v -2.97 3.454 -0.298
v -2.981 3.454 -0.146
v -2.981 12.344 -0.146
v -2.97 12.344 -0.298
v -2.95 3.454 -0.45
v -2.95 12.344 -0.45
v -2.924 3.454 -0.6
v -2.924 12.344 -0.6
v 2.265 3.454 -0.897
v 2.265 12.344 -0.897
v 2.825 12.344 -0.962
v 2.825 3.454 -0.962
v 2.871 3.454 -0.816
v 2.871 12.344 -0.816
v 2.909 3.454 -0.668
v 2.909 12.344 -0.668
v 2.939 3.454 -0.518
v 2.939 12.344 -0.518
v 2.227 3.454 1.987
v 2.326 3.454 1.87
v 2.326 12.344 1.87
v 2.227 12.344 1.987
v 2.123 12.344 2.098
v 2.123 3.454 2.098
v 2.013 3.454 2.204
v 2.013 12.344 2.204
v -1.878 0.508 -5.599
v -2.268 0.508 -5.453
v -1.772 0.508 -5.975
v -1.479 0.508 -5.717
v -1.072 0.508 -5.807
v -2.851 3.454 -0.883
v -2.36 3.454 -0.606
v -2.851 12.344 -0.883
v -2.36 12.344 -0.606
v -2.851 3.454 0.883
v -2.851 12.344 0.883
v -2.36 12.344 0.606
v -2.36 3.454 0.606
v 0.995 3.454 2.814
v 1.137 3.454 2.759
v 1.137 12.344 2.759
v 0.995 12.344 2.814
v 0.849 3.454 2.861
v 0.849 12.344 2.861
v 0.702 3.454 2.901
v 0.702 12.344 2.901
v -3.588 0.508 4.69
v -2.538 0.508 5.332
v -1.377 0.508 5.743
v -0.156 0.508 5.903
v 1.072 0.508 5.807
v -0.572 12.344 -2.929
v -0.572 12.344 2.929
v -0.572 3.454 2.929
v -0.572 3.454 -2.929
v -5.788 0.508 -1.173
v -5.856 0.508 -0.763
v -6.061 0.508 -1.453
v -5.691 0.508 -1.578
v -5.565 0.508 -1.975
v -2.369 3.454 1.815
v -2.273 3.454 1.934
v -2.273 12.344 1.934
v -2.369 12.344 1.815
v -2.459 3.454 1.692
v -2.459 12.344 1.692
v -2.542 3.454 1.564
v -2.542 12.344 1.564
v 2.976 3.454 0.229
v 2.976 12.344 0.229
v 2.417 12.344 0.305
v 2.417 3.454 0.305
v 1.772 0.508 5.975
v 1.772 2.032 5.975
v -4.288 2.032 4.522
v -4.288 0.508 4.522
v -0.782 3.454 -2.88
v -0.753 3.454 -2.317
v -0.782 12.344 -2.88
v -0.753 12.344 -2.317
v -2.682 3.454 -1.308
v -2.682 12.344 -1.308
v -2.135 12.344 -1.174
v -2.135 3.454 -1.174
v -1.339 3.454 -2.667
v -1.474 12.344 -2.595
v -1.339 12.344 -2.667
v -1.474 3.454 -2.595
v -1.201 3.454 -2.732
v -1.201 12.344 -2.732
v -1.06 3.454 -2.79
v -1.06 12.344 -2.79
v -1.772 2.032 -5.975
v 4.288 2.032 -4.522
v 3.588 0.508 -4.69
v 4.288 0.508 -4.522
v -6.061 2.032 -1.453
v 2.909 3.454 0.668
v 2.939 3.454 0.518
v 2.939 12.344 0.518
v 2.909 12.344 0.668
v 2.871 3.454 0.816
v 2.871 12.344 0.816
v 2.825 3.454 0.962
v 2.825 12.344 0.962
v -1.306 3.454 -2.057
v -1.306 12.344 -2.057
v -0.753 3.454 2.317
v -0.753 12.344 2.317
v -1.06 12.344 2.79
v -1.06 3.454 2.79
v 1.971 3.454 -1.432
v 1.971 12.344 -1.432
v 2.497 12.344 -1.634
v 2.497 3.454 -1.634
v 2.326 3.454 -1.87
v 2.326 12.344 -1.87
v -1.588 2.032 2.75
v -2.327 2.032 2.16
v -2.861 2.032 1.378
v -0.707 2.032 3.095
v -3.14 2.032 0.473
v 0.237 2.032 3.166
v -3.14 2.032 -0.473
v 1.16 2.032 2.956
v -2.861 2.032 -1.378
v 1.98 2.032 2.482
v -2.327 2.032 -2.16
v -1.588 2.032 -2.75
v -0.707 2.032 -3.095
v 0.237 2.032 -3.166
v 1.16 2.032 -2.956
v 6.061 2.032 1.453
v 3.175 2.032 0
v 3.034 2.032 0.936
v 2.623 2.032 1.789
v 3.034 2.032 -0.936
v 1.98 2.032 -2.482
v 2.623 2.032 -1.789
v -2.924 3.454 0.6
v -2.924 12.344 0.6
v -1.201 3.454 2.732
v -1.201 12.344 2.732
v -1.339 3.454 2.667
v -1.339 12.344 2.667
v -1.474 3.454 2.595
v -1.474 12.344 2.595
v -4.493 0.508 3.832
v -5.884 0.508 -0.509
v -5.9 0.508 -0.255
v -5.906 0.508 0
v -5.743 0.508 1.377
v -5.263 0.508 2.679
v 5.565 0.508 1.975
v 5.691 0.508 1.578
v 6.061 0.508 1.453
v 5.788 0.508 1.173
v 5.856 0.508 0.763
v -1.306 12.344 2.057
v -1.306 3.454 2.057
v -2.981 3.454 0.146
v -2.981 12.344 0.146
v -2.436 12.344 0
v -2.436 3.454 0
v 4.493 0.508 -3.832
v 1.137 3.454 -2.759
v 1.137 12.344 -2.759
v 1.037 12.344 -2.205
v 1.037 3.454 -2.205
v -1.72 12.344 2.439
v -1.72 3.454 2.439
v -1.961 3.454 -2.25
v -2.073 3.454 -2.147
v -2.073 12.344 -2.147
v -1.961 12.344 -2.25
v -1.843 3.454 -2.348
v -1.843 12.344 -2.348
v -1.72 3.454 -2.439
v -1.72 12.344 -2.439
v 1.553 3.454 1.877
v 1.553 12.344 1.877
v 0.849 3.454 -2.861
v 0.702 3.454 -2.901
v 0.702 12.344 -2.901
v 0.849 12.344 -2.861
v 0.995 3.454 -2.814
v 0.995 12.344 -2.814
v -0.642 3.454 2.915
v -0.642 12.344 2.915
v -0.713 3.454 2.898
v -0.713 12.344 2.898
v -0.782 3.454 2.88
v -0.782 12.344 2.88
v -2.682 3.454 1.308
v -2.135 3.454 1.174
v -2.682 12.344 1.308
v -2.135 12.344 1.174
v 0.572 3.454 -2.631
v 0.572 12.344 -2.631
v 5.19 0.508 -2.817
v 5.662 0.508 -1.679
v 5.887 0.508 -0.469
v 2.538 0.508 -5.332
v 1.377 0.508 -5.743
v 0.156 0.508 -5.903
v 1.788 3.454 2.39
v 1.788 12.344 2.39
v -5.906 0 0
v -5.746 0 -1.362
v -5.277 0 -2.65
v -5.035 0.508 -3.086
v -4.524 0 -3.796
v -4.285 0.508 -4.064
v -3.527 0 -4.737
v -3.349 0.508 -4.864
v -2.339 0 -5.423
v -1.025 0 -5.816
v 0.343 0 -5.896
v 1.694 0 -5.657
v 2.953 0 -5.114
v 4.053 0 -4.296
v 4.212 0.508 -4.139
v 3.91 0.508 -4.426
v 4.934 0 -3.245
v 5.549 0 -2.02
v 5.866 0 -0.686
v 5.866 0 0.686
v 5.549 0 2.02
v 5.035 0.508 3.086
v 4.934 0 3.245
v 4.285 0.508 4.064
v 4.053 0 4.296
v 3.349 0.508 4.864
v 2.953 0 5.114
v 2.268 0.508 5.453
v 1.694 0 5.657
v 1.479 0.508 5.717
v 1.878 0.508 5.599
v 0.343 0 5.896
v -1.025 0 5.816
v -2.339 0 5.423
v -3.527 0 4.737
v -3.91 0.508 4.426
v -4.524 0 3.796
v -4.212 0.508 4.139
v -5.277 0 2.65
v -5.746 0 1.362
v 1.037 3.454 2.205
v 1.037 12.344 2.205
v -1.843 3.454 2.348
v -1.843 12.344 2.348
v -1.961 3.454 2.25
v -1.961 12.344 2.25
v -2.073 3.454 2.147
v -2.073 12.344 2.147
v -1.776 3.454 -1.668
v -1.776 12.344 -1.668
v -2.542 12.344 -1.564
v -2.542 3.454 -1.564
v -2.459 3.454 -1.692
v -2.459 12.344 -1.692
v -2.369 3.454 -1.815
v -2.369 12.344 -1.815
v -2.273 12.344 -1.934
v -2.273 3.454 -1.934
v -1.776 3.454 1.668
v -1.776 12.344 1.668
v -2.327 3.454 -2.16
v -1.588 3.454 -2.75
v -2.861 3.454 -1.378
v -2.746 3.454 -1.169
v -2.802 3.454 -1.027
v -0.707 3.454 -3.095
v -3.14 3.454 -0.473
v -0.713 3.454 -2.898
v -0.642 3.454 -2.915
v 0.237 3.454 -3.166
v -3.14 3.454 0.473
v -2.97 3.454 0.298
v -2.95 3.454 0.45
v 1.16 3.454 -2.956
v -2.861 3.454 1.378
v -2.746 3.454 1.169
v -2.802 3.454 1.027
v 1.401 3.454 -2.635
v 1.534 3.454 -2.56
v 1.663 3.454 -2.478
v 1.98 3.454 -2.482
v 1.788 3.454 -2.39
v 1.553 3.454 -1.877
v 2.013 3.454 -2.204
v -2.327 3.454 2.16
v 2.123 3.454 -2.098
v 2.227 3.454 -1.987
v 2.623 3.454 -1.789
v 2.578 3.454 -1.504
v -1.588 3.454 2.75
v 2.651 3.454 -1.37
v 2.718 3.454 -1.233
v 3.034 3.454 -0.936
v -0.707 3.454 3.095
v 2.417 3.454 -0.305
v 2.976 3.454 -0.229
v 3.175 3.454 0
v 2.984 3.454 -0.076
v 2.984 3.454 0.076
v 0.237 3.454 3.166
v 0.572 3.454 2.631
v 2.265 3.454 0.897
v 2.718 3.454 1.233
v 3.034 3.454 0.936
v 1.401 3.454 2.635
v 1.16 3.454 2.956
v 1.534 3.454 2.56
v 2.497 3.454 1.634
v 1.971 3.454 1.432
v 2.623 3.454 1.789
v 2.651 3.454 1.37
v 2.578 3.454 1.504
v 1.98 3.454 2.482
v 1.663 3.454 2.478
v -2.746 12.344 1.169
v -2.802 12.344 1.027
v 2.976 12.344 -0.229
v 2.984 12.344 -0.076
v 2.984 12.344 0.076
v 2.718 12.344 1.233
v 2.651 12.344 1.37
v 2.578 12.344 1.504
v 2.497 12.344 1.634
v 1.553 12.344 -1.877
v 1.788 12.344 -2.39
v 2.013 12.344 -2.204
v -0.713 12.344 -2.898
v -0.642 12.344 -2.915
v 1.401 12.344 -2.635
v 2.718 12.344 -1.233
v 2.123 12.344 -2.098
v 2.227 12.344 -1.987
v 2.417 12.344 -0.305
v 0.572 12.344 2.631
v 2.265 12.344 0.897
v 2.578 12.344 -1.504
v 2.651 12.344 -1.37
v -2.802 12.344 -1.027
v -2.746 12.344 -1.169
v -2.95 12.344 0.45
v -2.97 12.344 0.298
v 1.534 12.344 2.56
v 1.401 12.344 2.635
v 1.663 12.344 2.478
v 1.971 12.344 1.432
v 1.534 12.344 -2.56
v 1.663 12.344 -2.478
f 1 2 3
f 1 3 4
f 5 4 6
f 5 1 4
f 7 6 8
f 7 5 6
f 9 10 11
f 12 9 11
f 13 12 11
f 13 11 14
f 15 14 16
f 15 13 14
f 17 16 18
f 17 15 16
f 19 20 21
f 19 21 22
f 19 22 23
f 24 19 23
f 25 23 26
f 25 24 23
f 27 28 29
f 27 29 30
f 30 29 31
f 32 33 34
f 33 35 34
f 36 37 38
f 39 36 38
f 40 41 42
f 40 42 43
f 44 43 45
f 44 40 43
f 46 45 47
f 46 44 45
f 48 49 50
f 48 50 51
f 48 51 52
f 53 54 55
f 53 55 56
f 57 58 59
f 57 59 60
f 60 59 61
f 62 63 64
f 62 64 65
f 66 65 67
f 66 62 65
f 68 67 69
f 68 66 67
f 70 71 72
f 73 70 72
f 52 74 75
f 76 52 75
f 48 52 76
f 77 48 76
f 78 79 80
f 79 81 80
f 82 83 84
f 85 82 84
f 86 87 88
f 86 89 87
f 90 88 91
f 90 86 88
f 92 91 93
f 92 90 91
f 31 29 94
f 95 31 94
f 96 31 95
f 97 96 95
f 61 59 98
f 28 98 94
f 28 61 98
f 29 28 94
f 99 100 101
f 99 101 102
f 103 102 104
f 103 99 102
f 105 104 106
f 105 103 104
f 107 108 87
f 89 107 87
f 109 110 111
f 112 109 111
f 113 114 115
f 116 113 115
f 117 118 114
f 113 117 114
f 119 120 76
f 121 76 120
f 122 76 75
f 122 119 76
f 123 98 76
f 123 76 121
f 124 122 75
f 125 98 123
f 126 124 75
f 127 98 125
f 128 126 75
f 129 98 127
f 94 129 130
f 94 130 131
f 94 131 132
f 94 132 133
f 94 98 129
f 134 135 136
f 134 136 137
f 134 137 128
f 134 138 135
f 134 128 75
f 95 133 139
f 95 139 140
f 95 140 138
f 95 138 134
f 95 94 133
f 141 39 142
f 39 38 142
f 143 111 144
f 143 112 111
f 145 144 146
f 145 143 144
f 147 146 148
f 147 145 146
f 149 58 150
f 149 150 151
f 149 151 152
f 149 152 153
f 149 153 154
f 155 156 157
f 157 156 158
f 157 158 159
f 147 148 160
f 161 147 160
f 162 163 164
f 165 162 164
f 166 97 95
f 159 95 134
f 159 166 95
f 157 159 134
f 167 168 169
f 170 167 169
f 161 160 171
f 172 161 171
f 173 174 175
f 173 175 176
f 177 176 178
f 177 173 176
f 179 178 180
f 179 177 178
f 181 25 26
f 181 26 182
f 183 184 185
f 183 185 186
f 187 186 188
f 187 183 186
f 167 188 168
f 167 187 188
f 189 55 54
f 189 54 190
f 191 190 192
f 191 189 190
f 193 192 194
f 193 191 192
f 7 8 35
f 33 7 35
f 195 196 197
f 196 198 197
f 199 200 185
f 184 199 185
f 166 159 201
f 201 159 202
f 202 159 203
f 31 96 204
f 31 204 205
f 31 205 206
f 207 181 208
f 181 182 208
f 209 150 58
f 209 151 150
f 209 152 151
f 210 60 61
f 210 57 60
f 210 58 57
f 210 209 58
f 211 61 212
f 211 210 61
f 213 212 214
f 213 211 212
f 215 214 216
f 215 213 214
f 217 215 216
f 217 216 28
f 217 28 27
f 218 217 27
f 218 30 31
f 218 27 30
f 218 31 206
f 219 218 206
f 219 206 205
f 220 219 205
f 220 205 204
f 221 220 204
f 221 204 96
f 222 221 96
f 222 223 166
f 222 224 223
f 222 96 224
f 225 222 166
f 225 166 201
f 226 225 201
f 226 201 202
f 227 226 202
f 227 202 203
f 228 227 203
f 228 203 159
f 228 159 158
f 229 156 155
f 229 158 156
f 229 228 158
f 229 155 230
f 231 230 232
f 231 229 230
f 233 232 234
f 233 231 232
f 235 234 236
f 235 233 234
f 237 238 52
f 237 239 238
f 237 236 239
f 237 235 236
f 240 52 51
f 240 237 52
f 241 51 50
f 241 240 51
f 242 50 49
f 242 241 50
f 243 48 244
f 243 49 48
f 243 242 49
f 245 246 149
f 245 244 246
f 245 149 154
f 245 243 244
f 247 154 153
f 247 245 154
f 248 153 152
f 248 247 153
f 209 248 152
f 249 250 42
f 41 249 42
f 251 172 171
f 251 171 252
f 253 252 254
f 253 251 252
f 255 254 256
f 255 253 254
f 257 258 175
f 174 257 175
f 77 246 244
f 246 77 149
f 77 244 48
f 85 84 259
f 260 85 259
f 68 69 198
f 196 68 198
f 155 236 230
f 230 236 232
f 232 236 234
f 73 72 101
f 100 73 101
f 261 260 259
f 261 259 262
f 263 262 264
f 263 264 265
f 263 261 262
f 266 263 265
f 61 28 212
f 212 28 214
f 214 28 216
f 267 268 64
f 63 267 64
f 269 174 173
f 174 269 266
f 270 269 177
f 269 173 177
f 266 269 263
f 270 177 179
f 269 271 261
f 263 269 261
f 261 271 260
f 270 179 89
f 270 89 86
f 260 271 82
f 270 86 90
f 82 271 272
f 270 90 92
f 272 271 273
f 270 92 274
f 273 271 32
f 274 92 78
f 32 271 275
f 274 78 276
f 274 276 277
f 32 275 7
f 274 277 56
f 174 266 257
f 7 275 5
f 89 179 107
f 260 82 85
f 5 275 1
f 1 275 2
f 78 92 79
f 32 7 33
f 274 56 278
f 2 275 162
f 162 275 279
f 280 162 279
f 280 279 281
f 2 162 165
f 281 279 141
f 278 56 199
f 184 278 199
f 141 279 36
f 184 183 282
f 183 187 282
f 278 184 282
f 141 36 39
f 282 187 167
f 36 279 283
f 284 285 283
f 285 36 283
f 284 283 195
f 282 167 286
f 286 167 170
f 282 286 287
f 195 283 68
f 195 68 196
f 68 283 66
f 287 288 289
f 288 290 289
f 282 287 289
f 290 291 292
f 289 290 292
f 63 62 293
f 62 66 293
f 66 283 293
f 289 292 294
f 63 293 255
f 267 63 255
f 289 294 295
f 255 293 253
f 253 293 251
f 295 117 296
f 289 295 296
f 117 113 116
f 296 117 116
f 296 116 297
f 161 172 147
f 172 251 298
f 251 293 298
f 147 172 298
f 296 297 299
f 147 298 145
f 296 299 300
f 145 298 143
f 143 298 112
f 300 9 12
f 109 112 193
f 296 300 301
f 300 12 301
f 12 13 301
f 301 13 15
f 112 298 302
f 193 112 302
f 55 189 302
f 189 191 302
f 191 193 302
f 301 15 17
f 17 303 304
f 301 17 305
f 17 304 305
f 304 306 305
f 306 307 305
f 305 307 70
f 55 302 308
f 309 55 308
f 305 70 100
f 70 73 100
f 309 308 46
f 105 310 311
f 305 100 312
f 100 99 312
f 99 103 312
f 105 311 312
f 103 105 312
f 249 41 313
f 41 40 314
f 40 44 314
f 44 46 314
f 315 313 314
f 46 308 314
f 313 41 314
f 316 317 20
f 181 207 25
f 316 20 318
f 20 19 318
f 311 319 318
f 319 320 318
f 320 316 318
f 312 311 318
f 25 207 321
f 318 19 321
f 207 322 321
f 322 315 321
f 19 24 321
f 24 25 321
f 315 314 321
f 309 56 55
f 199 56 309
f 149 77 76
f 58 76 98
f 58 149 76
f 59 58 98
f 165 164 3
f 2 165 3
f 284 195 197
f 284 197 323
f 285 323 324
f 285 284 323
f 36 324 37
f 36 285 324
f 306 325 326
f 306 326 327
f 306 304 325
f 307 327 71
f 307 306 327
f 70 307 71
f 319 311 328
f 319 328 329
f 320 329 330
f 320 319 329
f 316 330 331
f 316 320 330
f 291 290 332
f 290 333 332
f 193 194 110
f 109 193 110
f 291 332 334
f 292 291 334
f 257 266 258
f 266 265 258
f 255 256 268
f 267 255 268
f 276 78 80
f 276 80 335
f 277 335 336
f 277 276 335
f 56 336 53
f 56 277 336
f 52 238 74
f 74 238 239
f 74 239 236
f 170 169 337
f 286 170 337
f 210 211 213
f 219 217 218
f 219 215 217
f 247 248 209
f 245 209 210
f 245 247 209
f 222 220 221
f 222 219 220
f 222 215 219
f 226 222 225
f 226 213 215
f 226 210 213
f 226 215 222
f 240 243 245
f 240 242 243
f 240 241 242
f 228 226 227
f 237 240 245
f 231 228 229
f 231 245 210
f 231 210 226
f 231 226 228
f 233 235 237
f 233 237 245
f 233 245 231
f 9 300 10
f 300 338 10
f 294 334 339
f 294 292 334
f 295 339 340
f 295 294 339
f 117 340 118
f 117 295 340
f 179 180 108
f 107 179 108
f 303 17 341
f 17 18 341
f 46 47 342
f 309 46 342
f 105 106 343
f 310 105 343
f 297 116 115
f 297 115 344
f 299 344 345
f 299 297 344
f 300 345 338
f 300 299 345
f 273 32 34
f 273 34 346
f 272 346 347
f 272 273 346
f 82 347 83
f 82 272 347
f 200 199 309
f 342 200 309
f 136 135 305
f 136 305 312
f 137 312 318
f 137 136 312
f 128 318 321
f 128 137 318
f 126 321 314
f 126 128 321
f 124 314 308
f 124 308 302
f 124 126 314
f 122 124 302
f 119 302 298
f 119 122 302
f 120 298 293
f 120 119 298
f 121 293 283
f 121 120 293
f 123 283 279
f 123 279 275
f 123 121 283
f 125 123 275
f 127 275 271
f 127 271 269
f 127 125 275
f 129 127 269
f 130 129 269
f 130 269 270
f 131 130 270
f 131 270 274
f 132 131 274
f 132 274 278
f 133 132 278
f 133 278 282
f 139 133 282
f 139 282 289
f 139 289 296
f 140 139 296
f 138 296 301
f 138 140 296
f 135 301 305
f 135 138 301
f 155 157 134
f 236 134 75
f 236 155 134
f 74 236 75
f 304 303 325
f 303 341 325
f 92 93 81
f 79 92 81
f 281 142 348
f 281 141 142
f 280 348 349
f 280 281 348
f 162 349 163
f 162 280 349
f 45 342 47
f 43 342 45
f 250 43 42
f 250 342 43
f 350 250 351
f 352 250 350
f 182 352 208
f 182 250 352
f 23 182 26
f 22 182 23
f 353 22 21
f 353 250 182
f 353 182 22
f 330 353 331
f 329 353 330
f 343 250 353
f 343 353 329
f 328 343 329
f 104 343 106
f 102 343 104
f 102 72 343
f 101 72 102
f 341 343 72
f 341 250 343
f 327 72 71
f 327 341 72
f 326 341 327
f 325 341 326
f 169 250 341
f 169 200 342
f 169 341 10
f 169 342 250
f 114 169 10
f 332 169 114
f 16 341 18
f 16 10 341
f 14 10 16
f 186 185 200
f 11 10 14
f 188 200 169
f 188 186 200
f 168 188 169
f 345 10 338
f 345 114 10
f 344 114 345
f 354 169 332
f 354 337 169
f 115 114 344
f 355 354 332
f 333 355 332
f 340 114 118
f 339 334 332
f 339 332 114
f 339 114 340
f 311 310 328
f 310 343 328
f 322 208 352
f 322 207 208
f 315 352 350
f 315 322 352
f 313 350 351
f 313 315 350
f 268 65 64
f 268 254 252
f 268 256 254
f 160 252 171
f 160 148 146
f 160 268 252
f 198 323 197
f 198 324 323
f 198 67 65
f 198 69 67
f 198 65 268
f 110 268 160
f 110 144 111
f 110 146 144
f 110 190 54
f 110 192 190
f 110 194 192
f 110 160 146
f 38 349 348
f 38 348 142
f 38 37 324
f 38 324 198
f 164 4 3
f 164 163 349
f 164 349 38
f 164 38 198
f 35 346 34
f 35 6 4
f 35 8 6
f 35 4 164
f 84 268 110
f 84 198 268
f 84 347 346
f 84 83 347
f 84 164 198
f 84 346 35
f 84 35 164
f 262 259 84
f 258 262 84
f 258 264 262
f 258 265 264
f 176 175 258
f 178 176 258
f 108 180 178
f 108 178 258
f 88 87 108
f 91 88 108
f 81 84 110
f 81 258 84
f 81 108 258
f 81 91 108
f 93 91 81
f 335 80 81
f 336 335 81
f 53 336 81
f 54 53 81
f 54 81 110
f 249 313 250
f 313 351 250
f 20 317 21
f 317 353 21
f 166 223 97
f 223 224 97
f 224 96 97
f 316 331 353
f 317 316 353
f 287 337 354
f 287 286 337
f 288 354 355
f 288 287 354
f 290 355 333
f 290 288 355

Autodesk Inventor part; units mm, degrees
ref_plane "YZ Plane" through (0, 0, 0) normal (1, 0, 0) x (0, 1, 0)
ref_plane "XZ Plane" through (0, 0, 0) normal (0, 1, 0) x (-1, 0, 0)
ref_plane "XY Plane" through (0, 0, 0) normal (0, 0, 1) x (1, 0, 0)
sketch "Sketch1" plane through (0, 0, 0) normal (0, 1, 0) x (-1, 0, 0)
  circle A0 centre (0, 0) radius 5.9055
  dimension "d0" = 11.811
extrude "Extrusion1" add sketch "Sketch1" along normal blind 0.508
sketch "Sketch2" plane through (0, 0.508, 0) normal (0, 1, 0) x (1, 0, 0)
  line L0 (-6.0608, 1.4528) -> (-1.7723, 5.9752)
  line L1 (-1.7723, 5.9752) -> (4.2885, 4.5224)
  line L2 (4.2885, 4.5224) -> (6.0608, -1.4528)
  line L3 (6.0608, -1.4528) -> (1.7723, -5.9752)
  line L4 (1.7723, -5.9752) -> (-4.2885, -4.5224)
  line L5 (-4.2885, -4.5224) -> (-6.0608, 1.4528)
  point P0 (0, 0)
  point P1 (0, 0)
  dimension "d3" = 10.795
extrude "Extrusion2" add sketch "Sketch2" along normal blind 1.524
sketch "Sketch3" plane through (0, 0, 0) normal (0, -1, 0) x (1, 0, 0)
  circle A0 centre (0, 0) radius 3.175
  dimension "d6" = 6.35
extrude "Extrusion3" add sketch "Sketch3" against normal blind 3.4544
sketch "Sketch4" plane through (0, 3.4544, 0) normal (0, 1, 0) x (1, 0, 0)
  circle A0 centre (0, 0) radius 2.9845
  dimension "d9" = 5.969
extrude "Extrusion4" add sketch "Sketch4" along normal blind 8.89
sketch "Sketch5" plane through (0, 12.3444, 0) normal (0, 1, 0) x (1, 0, 0)
  line L0 (-3.3844, -0.254) -> (-2.4365, 0)
  line L1 (-2.4365, 0) -> (-3.3844, 0.254)
  line L2 (-3.3844, 0.254) -> (-3.3844, -0.254)
  line L3 (0, 0) -> (-2.1237, 0)
  dimension "d12" = 30
  dimension "d13" = 0.508
  dimension "d14" = 0.254
extrude "Extrusion5" cut sketch "Sketch5" against normal blind 8.89
pattern_circular "Circular Pattern2" count 25 over 360 about axis through (0, 3.4544, 0) along (0, 1, 0) of "Extrusion5"
sketch "Sketch6" plane through (0, 12.3444, 0) normal (0, 1, 0) x (1, 0, 0)
  line L0 (0.5715, -4.3158) -> (-0.5715, -4.3158)
  line L1 (-0.5715, -4.3158) -> (-0.5715, 4.3783)
  line L2 (-0.5715, 4.3783) -> (0.5715, 4.3783)
  line L3 (0.5715, 4.3783) -> (0.5715, -4.3158)
  point P0 (0, 0)
  dimension "d23" = 1.143
  dimension "d24" = 0.5715
extrude "Extrusion6" cut sketch "Sketch6" against normal blind 8.89
equation "\"d14\" = 0.5 * d13"
equation "\"d24\" = 0.5 * d23"
properties part number "Button_Knob" material "Stainless Steel"
